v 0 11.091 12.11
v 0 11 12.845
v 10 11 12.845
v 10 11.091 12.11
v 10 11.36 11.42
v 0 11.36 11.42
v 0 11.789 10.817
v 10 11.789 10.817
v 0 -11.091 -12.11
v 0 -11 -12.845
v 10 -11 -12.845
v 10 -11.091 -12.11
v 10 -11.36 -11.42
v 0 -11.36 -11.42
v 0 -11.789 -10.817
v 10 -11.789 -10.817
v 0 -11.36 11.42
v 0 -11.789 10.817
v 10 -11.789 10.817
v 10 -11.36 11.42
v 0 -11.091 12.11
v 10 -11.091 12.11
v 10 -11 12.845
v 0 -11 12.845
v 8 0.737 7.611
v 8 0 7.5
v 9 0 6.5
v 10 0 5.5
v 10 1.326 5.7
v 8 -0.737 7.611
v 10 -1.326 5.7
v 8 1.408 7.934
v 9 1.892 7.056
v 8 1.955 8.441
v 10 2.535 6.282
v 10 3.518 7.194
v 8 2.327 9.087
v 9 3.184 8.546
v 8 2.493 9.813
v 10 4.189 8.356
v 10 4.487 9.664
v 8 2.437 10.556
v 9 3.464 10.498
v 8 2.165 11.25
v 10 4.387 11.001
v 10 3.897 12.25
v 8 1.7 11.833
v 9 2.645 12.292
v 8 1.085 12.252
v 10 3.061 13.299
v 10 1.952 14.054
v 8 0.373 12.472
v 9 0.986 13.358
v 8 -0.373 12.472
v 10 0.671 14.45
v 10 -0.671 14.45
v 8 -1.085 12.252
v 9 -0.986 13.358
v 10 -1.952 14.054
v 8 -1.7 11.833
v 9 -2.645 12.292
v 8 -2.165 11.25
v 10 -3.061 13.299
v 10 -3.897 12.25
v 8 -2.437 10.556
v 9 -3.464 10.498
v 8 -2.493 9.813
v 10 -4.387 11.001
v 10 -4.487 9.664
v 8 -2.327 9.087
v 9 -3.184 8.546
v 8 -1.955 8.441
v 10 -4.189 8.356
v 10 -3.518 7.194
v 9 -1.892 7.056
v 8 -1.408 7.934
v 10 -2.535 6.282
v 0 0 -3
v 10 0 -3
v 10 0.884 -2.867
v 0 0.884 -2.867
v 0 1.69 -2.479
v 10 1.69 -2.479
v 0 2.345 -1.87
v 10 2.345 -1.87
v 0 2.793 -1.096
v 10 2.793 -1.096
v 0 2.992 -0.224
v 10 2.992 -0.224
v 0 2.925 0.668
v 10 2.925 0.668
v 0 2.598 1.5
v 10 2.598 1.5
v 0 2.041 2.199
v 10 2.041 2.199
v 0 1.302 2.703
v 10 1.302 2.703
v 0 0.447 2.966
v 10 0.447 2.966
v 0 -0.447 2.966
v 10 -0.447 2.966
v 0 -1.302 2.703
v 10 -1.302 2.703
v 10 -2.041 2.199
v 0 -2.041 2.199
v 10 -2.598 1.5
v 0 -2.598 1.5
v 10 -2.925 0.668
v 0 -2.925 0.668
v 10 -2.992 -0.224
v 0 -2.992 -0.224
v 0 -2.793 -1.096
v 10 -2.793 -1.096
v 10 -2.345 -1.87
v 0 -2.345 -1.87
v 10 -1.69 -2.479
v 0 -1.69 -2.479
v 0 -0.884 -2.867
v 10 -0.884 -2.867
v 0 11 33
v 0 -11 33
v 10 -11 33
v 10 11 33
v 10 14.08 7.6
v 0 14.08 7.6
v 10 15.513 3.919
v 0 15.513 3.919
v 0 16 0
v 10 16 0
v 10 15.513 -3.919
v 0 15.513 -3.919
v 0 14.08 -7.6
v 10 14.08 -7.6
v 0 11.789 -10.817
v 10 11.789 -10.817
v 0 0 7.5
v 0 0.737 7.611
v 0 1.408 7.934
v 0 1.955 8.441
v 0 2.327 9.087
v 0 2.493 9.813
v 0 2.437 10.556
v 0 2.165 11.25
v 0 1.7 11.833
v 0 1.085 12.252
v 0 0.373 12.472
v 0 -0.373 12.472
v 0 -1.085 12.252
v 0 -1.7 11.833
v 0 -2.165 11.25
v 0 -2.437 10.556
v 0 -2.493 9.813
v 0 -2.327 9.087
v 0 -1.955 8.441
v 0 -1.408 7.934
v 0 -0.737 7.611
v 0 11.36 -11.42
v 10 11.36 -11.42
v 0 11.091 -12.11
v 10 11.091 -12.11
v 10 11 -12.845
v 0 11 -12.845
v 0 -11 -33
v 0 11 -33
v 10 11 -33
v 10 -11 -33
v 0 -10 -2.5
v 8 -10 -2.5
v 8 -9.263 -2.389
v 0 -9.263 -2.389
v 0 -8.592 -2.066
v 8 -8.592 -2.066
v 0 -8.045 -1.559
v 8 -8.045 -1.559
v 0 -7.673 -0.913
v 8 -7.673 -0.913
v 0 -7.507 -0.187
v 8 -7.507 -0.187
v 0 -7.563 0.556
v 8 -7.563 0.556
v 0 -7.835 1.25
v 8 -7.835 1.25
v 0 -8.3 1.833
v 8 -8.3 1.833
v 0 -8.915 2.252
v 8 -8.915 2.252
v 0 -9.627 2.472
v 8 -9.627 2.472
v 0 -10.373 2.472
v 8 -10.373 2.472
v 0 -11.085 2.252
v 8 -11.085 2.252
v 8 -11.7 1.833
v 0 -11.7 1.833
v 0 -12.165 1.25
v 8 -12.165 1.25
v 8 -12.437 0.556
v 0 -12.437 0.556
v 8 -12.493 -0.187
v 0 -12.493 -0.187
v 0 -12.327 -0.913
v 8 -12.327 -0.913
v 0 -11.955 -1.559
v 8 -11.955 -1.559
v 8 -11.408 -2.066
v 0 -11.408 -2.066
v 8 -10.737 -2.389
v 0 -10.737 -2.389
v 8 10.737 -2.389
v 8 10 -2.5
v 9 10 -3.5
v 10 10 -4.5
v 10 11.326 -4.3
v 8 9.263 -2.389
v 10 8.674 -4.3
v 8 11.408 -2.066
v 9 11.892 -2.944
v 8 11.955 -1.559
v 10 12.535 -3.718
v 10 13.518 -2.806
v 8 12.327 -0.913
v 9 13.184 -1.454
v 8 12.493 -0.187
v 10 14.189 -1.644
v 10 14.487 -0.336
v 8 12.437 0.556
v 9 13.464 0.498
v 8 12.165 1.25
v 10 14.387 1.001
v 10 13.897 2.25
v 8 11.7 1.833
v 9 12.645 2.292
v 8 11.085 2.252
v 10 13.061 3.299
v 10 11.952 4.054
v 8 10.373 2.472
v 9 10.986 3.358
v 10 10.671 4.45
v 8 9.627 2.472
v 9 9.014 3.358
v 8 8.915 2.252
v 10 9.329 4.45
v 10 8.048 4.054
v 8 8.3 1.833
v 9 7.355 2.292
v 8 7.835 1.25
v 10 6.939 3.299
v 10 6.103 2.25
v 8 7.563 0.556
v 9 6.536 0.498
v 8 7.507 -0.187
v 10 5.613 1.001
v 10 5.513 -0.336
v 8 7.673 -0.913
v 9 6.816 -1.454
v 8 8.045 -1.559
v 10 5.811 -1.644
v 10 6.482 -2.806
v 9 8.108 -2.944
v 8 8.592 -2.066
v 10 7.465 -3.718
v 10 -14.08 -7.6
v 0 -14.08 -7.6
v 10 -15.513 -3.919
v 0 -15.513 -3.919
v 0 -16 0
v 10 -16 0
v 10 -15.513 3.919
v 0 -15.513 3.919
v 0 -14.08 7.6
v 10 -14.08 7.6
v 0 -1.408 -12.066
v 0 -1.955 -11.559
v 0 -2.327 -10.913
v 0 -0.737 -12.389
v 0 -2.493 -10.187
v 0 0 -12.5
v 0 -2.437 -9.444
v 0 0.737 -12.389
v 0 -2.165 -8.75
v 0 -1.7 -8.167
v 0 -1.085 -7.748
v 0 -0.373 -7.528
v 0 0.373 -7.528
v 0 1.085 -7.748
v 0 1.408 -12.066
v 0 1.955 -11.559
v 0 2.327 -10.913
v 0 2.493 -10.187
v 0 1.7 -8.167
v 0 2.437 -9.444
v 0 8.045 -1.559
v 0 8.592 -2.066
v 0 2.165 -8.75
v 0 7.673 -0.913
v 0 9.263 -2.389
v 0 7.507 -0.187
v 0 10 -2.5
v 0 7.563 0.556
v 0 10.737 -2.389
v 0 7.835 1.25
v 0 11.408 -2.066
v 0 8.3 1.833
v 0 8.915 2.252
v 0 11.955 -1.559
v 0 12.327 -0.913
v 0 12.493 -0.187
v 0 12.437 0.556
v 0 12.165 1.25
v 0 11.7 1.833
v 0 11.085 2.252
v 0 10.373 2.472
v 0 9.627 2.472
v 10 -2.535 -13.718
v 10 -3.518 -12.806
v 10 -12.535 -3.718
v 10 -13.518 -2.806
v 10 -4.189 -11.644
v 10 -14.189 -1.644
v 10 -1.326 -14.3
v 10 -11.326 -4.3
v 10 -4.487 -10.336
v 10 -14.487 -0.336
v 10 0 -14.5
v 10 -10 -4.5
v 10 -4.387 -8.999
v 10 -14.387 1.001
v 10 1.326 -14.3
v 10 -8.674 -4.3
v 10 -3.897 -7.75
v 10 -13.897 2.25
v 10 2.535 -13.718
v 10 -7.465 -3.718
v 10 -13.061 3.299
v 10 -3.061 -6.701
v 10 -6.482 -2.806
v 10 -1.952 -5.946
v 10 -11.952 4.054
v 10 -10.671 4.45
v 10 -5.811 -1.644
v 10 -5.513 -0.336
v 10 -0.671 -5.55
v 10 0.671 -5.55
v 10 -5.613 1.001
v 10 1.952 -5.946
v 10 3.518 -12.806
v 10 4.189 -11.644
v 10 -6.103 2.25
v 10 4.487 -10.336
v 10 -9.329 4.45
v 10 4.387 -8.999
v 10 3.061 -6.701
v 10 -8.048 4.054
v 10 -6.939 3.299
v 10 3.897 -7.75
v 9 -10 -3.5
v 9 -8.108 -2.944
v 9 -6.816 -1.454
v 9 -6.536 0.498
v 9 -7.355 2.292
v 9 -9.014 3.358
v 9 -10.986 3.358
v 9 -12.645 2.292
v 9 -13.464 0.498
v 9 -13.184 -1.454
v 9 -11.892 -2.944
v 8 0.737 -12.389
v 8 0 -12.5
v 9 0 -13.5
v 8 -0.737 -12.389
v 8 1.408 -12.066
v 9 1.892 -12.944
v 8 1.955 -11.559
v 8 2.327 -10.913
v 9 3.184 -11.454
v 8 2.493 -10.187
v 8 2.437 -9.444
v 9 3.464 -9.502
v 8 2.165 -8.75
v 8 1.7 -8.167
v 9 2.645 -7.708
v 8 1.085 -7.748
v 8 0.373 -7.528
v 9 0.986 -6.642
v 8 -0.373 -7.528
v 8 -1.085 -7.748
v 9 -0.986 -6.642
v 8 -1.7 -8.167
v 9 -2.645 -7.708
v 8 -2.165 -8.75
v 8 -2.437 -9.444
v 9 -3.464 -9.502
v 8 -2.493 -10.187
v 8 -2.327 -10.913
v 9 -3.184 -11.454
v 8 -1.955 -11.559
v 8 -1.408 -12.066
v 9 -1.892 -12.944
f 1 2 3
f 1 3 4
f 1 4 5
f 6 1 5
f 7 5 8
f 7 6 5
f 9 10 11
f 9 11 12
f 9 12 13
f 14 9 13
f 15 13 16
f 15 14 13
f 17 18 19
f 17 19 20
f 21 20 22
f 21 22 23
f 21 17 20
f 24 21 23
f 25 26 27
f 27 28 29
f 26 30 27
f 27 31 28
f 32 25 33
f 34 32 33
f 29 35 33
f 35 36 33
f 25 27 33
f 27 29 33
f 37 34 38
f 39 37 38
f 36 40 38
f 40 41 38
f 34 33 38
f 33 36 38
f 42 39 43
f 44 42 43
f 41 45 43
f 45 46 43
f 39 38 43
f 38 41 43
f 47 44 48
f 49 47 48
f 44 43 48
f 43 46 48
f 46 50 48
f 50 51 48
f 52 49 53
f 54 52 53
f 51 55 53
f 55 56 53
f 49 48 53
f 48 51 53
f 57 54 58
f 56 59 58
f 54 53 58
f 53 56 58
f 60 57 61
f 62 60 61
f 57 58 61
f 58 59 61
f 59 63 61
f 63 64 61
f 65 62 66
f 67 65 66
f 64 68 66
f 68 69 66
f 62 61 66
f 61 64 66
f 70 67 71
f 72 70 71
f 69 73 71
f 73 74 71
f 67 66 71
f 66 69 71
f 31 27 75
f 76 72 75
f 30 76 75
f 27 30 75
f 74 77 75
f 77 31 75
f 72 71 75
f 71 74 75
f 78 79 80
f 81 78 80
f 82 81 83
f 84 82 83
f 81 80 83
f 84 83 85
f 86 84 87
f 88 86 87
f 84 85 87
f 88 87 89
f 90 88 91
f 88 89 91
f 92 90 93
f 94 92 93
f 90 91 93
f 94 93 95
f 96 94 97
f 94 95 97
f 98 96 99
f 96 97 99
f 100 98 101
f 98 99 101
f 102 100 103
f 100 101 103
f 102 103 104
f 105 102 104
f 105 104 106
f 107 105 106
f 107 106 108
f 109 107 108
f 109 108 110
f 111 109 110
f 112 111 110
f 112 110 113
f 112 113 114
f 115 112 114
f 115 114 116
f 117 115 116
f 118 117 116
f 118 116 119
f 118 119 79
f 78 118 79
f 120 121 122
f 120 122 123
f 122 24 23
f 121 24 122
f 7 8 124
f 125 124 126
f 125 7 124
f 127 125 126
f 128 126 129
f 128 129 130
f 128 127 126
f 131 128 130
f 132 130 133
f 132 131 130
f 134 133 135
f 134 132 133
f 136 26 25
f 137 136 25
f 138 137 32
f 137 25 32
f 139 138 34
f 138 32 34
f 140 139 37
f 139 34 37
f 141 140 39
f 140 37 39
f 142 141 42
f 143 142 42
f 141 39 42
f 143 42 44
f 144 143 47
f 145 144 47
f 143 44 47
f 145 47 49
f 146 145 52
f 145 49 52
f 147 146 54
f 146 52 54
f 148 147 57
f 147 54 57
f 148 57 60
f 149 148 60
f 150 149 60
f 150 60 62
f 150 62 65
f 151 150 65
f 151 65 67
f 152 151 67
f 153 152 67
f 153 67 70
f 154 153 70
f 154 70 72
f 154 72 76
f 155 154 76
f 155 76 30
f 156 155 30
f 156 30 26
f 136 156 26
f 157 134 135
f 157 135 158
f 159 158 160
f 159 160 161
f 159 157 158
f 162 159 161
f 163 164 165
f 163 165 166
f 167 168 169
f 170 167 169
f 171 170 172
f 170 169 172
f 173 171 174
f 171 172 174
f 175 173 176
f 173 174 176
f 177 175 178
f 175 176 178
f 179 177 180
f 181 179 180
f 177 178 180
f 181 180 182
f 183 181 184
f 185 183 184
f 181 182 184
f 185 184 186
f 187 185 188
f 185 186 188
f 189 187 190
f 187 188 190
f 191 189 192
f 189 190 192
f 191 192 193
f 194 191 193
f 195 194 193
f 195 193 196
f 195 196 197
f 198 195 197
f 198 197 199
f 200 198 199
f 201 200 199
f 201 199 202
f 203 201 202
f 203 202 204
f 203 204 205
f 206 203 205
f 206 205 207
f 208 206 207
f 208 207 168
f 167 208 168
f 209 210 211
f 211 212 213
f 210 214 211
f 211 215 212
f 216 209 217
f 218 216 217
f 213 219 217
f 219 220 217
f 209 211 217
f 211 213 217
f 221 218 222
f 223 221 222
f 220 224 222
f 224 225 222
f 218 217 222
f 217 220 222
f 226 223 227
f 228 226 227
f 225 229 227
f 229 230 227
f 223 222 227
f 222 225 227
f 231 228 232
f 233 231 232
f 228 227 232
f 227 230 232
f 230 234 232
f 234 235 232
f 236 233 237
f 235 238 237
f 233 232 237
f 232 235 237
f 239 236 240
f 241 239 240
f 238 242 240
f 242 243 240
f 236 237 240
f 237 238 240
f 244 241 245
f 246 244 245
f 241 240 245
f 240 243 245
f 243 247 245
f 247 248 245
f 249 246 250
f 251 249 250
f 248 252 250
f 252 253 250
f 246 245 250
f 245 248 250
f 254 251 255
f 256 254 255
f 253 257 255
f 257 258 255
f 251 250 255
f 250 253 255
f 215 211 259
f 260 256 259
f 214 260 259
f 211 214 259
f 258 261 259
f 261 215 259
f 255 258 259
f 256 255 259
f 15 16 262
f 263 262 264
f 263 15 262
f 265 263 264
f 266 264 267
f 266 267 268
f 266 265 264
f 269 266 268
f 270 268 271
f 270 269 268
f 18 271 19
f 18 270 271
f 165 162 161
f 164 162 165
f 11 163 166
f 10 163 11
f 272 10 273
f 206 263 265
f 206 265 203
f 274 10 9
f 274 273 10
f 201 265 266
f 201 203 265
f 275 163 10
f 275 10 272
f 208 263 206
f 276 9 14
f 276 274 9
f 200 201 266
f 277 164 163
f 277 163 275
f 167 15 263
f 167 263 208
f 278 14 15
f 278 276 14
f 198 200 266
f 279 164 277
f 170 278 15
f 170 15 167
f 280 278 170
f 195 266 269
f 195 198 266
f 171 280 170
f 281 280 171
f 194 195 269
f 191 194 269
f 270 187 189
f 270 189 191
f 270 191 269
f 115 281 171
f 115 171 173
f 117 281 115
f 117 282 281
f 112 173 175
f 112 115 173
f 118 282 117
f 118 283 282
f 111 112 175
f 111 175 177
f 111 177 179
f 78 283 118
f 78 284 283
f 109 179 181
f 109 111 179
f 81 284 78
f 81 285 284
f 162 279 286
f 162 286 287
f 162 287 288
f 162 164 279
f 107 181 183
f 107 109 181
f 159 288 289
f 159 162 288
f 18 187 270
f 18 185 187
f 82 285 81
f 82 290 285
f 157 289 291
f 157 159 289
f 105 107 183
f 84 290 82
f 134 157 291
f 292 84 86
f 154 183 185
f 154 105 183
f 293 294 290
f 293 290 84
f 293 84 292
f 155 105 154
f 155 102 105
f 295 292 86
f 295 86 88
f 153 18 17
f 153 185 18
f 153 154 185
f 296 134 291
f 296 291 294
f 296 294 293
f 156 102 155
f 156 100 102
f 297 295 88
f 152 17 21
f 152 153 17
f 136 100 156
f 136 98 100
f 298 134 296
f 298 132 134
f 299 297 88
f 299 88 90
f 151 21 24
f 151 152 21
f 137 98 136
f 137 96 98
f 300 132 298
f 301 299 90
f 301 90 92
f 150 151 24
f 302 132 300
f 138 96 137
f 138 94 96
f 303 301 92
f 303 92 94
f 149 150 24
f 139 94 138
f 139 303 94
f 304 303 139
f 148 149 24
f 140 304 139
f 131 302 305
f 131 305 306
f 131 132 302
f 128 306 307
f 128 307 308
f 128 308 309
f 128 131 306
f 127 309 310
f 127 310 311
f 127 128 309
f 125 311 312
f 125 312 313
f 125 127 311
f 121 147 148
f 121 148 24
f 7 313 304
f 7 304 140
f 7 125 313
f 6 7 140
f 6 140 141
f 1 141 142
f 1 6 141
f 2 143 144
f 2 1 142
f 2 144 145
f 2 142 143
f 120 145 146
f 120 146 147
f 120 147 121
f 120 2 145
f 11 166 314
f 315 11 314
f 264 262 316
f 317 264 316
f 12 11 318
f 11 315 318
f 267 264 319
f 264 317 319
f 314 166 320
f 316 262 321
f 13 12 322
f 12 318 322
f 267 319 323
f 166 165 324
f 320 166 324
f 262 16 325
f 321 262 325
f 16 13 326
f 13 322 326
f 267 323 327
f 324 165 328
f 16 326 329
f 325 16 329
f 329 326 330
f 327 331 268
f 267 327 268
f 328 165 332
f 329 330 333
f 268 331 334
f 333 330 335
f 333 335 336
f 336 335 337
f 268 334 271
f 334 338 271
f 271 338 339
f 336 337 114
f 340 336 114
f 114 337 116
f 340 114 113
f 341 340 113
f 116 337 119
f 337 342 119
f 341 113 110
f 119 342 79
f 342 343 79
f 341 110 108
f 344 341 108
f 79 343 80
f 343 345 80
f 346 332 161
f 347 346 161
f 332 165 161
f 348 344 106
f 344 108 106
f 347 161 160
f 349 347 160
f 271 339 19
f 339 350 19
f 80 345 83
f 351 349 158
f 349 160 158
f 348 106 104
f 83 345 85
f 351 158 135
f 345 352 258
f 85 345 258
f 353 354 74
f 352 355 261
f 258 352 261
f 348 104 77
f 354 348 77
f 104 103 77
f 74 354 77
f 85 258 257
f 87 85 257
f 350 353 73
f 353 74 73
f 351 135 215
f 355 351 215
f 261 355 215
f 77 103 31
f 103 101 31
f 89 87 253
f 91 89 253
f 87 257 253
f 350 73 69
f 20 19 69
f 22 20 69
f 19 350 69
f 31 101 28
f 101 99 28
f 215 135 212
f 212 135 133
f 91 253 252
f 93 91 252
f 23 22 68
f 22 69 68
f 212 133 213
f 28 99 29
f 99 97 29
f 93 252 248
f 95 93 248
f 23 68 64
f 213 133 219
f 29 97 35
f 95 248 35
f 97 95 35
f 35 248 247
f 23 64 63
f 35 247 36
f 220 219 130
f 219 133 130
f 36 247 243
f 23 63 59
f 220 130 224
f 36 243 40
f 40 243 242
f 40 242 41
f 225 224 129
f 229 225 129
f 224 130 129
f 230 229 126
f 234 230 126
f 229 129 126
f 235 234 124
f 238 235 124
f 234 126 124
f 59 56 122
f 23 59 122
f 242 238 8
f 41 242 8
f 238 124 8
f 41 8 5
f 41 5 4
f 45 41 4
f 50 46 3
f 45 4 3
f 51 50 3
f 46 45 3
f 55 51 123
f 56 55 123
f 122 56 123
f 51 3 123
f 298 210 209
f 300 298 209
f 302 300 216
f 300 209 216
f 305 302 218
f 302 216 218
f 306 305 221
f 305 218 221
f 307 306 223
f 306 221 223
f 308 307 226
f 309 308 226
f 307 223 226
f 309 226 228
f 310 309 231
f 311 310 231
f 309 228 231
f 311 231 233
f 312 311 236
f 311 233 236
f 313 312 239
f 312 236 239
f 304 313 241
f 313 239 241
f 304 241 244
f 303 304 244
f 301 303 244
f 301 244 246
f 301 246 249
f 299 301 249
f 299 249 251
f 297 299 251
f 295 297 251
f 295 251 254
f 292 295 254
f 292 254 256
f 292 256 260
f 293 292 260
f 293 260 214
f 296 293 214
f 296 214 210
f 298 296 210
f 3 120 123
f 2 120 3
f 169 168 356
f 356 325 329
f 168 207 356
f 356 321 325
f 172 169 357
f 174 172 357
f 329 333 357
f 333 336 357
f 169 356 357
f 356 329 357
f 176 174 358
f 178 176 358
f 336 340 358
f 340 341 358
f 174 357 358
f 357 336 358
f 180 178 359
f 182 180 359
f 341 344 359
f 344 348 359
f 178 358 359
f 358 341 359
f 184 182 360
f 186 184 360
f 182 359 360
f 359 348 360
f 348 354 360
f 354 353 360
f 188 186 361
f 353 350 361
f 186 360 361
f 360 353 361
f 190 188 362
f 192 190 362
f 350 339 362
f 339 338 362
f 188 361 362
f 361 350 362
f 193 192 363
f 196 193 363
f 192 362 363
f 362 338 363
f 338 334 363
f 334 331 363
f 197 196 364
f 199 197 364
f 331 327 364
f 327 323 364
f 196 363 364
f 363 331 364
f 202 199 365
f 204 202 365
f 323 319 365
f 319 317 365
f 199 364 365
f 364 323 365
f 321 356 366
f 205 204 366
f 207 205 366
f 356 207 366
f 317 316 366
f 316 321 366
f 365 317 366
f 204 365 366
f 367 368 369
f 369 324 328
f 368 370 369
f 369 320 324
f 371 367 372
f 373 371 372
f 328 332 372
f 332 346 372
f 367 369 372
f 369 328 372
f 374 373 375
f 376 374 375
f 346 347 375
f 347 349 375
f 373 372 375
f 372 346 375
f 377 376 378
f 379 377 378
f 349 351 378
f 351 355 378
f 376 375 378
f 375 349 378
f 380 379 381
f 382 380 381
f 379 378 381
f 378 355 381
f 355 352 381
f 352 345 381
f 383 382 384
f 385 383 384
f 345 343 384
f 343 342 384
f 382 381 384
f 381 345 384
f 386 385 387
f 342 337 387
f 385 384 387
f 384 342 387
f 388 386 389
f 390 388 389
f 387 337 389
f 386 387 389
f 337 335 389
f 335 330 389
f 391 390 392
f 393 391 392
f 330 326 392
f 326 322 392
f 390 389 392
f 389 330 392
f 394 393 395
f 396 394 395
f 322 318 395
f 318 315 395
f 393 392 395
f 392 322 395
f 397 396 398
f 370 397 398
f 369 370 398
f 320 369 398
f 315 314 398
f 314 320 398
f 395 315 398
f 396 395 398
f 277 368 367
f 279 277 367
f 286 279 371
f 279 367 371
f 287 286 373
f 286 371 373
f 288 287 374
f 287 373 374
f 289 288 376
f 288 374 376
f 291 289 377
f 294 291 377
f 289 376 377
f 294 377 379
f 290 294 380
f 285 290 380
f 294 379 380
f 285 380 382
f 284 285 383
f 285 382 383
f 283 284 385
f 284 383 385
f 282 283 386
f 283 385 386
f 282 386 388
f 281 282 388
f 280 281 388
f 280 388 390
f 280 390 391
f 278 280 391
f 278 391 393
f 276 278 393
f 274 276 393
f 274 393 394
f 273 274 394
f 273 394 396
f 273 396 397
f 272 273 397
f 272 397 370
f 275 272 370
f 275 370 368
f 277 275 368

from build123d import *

# Parameters (mm, degrees)
EXTRUDE_1_DEPTH               = 10
SKETCH_2_R                    = 2.5
CUT_EXTRUDE_2_DEPTH           = 39.013155617
SKETCH_4_R                    = 4.5
CUT_EXTRUDE_3_DEPTH           = 2
CUT_EXTRUDE_3_DRAFT           = -45
CUT_EXTRUDE_3_PROFILE_2_DEPTH = 2
CUT_EXTRUDE_3_PROFILE_2_DRAFT = -45
CUT_EXTRUDE_3_PROFILE_3_DEPTH = 2
CUT_EXTRUDE_3_PROFILE_3_DRAFT = -45
CUT_EXTRUDE_3_PROFILE_4_DEPTH = 2
CUT_EXTRUDE_3_PROFILE_4_DRAFT = -45
SKETCH_5_R                    = 3
CUT_EXTRUDE_4_DEPTH           = 39.013155617


with BuildPart() as part:
    # Эскиз1 → Вытянуть1 (new body)
    with BuildSketch(Plane(origin=(0, 0, 0), x_dir=(0, 0, -1), z_dir=(1, 0, 0))):
        with BuildLine():
            Line((12.845232579, 11), (33, 11))
            Line((33, 11), (33, -11))
            Line((33, -11), (12.845232579, -11))
            ThreePointArc((12.845232579, -11), (11.757018204, -11.204326651), (10.817037961, -11.789473684))
            ThreePointArc((10.817037961, -11.789473684), (0, -16), (-10.817037961, -11.789473684))
            ThreePointArc((-10.817037961, -11.789473684), (-11.757018204, -11.204326651), (-12.845232579, -11))
            Line((-12.845232579, -11), (-33, -11))
            Line((-33, -11), (-33, 11))
            Line((-33, 11), (-12.845232579, 11))
            ThreePointArc((-12.845232579, 11), (-11.757018204, 11.204326651), (-10.817037961, 11.789473684))
            ThreePointArc((-10.817037961, 11.789473684), (0, 16), (10.817037961, 11.789473684))
            ThreePointArc((10.817037961, 11.789473684), (11.757018204, 11.204326651), (12.845232579, 11))
        make_face()
    extrude(amount=EXTRUDE_1_DEPTH)

    # Эскиз2 → Вытянуть2 (cut, through all)
    with BuildSketch(Plane(origin=(10, 0, 0), x_dir=(0, 0, -1), z_dir=(1, 0, 0))):
        with Locations((0, 10)):
            Circle(SKETCH_2_R)
        with Locations((10, 0)):
            Circle(SKETCH_2_R)
        with Locations((0, -10)):
            Circle(SKETCH_2_R)
        with Locations((-10, 0)):
            Circle(SKETCH_2_R)
    extrude(amount=-CUT_EXTRUDE_2_DEPTH, mode=Mode.SUBTRACT)


with BuildPart() as cut_extrude_3_tool:
    # Эскиз4 → Вытянуть3 (with draft: the straight prism first)
    with BuildSketch(Plane(origin=(10, 0, 0), x_dir=(0, 0, -1), z_dir=(1, 0, 0))):
        with Locations((0, 10)):
            Circle(SKETCH_4_R)
    extrude(amount=-CUT_EXTRUDE_3_DEPTH)
    # Вытянуть3: the draft: its side faces are tilted about the plane it starts from
    cut_extrude_3_sides = [cut_extrude_3_tool.faces().sort_by_distance(p)[0] for p in [
        (9, 10, 4.5),
    ]]
    draft(cut_extrude_3_sides, Plane(origin=(10, 0, 0), x_dir=(0, 0, -1), z_dir=(1, 0, 0)), CUT_EXTRUDE_3_DRAFT)


with BuildPart() as part_1:
    add(part.part)

    # Вытянуть3: cut by cut_extrude_3_tool
    add(cut_extrude_3_tool.part, mode=Mode.SUBTRACT)


with BuildPart() as cut_extrude_3_profile_2_tool:
    # Эскиз4 → Вытянуть3 profile 2 (with draft: the straight prism first)
    with BuildSketch(Plane(origin=(10, 0, 0), x_dir=(0, 0, -1), z_dir=(1, 0, 0))):
        with Locations((10, 0)):
            Circle(SKETCH_4_R)
    extrude(amount=-CUT_EXTRUDE_3_PROFILE_2_DEPTH)
    # Вытянуть3 profile 2: the draft: its side faces are tilted about the plane it starts from
    cut_extrude_3_profile_2_sides = [cut_extrude_3_profile_2_tool.faces().sort_by_distance(p)[0] for p in [
        (9, 0, -5.5),
    ]]
    draft(cut_extrude_3_profile_2_sides, Plane(origin=(10, 0, 0), x_dir=(0, 0, -1), z_dir=(1, 0, 0)), CUT_EXTRUDE_3_PROFILE_2_DRAFT)


with BuildPart() as part_2:
    add(part_1.part)

    # Вытянуть3 profile 2: cut by cut_extrude_3_profile_2_tool
    add(cut_extrude_3_profile_2_tool.part, mode=Mode.SUBTRACT)


with BuildPart() as cut_extrude_3_profile_3_tool:
    # Эскиз4 → Вытянуть3 profile 3 (with draft: the straight prism first)
    with BuildSketch(Plane(origin=(10, 0, 0), x_dir=(0, 0, -1), z_dir=(1, 0, 0))):
        with Locations((0, -10)):
            Circle(SKETCH_4_R)
    extrude(amount=-CUT_EXTRUDE_3_PROFILE_3_DEPTH)
    # Вытянуть3 profile 3: the draft: its side faces are tilted about the plane it starts from
    cut_extrude_3_profile_3_sides = [cut_extrude_3_profile_3_tool.faces().sort_by_distance(p)[0] for p in [
        (9, -10, 4.5),
    ]]
    draft(cut_extrude_3_profile_3_sides, Plane(origin=(10, 0, 0), x_dir=(0, 0, -1), z_dir=(1, 0, 0)), CUT_EXTRUDE_3_PROFILE_3_DRAFT)


with BuildPart() as part_3:
    add(part_2.part)

    # Вытянуть3 profile 3: cut by cut_extrude_3_profile_3_tool
    add(cut_extrude_3_profile_3_tool.part, mode=Mode.SUBTRACT)


with BuildPart() as cut_extrude_3_profile_4_tool:
    # Эскиз4 → Вытянуть3 profile 4 (with draft: the straight prism first)
    with BuildSketch(Plane(origin=(10, 0, 0), x_dir=(0, 0, -1), z_dir=(1, 0, 0))):
        with Locations((-10, 0)):
            Circle(SKETCH_4_R)
    extrude(amount=-CUT_EXTRUDE_3_PROFILE_4_DEPTH)
    # Вытянуть3 profile 4: the draft: its side faces are tilted about the plane it starts from
    cut_extrude_3_profile_4_sides = [cut_extrude_3_profile_4_tool.faces().sort_by_distance(p)[0] for p in [
        (9, 0, 14.5),
    ]]
    draft(cut_extrude_3_profile_4_sides, Plane(origin=(10, 0, 0), x_dir=(0, 0, -1), z_dir=(1, 0, 0)), CUT_EXTRUDE_3_PROFILE_4_DRAFT)


with BuildPart() as part_4:
    add(part_3.part)

    # Вытянуть3 profile 4: cut by cut_extrude_3_profile_4_tool
    add(cut_extrude_3_profile_4_tool.part, mode=Mode.SUBTRACT)

    # Эскиз5 → Вытянуть4 (cut, through all)
    with BuildSketch(Plane(origin=(10, 0, 0), x_dir=(0, 0, -1), z_dir=(1, 0, 0))):
        Circle(SKETCH_5_R)
    extrude(amount=-CUT_EXTRUDE_4_DEPTH, mode=Mode.SUBTRACT)


solid = part_4.part
